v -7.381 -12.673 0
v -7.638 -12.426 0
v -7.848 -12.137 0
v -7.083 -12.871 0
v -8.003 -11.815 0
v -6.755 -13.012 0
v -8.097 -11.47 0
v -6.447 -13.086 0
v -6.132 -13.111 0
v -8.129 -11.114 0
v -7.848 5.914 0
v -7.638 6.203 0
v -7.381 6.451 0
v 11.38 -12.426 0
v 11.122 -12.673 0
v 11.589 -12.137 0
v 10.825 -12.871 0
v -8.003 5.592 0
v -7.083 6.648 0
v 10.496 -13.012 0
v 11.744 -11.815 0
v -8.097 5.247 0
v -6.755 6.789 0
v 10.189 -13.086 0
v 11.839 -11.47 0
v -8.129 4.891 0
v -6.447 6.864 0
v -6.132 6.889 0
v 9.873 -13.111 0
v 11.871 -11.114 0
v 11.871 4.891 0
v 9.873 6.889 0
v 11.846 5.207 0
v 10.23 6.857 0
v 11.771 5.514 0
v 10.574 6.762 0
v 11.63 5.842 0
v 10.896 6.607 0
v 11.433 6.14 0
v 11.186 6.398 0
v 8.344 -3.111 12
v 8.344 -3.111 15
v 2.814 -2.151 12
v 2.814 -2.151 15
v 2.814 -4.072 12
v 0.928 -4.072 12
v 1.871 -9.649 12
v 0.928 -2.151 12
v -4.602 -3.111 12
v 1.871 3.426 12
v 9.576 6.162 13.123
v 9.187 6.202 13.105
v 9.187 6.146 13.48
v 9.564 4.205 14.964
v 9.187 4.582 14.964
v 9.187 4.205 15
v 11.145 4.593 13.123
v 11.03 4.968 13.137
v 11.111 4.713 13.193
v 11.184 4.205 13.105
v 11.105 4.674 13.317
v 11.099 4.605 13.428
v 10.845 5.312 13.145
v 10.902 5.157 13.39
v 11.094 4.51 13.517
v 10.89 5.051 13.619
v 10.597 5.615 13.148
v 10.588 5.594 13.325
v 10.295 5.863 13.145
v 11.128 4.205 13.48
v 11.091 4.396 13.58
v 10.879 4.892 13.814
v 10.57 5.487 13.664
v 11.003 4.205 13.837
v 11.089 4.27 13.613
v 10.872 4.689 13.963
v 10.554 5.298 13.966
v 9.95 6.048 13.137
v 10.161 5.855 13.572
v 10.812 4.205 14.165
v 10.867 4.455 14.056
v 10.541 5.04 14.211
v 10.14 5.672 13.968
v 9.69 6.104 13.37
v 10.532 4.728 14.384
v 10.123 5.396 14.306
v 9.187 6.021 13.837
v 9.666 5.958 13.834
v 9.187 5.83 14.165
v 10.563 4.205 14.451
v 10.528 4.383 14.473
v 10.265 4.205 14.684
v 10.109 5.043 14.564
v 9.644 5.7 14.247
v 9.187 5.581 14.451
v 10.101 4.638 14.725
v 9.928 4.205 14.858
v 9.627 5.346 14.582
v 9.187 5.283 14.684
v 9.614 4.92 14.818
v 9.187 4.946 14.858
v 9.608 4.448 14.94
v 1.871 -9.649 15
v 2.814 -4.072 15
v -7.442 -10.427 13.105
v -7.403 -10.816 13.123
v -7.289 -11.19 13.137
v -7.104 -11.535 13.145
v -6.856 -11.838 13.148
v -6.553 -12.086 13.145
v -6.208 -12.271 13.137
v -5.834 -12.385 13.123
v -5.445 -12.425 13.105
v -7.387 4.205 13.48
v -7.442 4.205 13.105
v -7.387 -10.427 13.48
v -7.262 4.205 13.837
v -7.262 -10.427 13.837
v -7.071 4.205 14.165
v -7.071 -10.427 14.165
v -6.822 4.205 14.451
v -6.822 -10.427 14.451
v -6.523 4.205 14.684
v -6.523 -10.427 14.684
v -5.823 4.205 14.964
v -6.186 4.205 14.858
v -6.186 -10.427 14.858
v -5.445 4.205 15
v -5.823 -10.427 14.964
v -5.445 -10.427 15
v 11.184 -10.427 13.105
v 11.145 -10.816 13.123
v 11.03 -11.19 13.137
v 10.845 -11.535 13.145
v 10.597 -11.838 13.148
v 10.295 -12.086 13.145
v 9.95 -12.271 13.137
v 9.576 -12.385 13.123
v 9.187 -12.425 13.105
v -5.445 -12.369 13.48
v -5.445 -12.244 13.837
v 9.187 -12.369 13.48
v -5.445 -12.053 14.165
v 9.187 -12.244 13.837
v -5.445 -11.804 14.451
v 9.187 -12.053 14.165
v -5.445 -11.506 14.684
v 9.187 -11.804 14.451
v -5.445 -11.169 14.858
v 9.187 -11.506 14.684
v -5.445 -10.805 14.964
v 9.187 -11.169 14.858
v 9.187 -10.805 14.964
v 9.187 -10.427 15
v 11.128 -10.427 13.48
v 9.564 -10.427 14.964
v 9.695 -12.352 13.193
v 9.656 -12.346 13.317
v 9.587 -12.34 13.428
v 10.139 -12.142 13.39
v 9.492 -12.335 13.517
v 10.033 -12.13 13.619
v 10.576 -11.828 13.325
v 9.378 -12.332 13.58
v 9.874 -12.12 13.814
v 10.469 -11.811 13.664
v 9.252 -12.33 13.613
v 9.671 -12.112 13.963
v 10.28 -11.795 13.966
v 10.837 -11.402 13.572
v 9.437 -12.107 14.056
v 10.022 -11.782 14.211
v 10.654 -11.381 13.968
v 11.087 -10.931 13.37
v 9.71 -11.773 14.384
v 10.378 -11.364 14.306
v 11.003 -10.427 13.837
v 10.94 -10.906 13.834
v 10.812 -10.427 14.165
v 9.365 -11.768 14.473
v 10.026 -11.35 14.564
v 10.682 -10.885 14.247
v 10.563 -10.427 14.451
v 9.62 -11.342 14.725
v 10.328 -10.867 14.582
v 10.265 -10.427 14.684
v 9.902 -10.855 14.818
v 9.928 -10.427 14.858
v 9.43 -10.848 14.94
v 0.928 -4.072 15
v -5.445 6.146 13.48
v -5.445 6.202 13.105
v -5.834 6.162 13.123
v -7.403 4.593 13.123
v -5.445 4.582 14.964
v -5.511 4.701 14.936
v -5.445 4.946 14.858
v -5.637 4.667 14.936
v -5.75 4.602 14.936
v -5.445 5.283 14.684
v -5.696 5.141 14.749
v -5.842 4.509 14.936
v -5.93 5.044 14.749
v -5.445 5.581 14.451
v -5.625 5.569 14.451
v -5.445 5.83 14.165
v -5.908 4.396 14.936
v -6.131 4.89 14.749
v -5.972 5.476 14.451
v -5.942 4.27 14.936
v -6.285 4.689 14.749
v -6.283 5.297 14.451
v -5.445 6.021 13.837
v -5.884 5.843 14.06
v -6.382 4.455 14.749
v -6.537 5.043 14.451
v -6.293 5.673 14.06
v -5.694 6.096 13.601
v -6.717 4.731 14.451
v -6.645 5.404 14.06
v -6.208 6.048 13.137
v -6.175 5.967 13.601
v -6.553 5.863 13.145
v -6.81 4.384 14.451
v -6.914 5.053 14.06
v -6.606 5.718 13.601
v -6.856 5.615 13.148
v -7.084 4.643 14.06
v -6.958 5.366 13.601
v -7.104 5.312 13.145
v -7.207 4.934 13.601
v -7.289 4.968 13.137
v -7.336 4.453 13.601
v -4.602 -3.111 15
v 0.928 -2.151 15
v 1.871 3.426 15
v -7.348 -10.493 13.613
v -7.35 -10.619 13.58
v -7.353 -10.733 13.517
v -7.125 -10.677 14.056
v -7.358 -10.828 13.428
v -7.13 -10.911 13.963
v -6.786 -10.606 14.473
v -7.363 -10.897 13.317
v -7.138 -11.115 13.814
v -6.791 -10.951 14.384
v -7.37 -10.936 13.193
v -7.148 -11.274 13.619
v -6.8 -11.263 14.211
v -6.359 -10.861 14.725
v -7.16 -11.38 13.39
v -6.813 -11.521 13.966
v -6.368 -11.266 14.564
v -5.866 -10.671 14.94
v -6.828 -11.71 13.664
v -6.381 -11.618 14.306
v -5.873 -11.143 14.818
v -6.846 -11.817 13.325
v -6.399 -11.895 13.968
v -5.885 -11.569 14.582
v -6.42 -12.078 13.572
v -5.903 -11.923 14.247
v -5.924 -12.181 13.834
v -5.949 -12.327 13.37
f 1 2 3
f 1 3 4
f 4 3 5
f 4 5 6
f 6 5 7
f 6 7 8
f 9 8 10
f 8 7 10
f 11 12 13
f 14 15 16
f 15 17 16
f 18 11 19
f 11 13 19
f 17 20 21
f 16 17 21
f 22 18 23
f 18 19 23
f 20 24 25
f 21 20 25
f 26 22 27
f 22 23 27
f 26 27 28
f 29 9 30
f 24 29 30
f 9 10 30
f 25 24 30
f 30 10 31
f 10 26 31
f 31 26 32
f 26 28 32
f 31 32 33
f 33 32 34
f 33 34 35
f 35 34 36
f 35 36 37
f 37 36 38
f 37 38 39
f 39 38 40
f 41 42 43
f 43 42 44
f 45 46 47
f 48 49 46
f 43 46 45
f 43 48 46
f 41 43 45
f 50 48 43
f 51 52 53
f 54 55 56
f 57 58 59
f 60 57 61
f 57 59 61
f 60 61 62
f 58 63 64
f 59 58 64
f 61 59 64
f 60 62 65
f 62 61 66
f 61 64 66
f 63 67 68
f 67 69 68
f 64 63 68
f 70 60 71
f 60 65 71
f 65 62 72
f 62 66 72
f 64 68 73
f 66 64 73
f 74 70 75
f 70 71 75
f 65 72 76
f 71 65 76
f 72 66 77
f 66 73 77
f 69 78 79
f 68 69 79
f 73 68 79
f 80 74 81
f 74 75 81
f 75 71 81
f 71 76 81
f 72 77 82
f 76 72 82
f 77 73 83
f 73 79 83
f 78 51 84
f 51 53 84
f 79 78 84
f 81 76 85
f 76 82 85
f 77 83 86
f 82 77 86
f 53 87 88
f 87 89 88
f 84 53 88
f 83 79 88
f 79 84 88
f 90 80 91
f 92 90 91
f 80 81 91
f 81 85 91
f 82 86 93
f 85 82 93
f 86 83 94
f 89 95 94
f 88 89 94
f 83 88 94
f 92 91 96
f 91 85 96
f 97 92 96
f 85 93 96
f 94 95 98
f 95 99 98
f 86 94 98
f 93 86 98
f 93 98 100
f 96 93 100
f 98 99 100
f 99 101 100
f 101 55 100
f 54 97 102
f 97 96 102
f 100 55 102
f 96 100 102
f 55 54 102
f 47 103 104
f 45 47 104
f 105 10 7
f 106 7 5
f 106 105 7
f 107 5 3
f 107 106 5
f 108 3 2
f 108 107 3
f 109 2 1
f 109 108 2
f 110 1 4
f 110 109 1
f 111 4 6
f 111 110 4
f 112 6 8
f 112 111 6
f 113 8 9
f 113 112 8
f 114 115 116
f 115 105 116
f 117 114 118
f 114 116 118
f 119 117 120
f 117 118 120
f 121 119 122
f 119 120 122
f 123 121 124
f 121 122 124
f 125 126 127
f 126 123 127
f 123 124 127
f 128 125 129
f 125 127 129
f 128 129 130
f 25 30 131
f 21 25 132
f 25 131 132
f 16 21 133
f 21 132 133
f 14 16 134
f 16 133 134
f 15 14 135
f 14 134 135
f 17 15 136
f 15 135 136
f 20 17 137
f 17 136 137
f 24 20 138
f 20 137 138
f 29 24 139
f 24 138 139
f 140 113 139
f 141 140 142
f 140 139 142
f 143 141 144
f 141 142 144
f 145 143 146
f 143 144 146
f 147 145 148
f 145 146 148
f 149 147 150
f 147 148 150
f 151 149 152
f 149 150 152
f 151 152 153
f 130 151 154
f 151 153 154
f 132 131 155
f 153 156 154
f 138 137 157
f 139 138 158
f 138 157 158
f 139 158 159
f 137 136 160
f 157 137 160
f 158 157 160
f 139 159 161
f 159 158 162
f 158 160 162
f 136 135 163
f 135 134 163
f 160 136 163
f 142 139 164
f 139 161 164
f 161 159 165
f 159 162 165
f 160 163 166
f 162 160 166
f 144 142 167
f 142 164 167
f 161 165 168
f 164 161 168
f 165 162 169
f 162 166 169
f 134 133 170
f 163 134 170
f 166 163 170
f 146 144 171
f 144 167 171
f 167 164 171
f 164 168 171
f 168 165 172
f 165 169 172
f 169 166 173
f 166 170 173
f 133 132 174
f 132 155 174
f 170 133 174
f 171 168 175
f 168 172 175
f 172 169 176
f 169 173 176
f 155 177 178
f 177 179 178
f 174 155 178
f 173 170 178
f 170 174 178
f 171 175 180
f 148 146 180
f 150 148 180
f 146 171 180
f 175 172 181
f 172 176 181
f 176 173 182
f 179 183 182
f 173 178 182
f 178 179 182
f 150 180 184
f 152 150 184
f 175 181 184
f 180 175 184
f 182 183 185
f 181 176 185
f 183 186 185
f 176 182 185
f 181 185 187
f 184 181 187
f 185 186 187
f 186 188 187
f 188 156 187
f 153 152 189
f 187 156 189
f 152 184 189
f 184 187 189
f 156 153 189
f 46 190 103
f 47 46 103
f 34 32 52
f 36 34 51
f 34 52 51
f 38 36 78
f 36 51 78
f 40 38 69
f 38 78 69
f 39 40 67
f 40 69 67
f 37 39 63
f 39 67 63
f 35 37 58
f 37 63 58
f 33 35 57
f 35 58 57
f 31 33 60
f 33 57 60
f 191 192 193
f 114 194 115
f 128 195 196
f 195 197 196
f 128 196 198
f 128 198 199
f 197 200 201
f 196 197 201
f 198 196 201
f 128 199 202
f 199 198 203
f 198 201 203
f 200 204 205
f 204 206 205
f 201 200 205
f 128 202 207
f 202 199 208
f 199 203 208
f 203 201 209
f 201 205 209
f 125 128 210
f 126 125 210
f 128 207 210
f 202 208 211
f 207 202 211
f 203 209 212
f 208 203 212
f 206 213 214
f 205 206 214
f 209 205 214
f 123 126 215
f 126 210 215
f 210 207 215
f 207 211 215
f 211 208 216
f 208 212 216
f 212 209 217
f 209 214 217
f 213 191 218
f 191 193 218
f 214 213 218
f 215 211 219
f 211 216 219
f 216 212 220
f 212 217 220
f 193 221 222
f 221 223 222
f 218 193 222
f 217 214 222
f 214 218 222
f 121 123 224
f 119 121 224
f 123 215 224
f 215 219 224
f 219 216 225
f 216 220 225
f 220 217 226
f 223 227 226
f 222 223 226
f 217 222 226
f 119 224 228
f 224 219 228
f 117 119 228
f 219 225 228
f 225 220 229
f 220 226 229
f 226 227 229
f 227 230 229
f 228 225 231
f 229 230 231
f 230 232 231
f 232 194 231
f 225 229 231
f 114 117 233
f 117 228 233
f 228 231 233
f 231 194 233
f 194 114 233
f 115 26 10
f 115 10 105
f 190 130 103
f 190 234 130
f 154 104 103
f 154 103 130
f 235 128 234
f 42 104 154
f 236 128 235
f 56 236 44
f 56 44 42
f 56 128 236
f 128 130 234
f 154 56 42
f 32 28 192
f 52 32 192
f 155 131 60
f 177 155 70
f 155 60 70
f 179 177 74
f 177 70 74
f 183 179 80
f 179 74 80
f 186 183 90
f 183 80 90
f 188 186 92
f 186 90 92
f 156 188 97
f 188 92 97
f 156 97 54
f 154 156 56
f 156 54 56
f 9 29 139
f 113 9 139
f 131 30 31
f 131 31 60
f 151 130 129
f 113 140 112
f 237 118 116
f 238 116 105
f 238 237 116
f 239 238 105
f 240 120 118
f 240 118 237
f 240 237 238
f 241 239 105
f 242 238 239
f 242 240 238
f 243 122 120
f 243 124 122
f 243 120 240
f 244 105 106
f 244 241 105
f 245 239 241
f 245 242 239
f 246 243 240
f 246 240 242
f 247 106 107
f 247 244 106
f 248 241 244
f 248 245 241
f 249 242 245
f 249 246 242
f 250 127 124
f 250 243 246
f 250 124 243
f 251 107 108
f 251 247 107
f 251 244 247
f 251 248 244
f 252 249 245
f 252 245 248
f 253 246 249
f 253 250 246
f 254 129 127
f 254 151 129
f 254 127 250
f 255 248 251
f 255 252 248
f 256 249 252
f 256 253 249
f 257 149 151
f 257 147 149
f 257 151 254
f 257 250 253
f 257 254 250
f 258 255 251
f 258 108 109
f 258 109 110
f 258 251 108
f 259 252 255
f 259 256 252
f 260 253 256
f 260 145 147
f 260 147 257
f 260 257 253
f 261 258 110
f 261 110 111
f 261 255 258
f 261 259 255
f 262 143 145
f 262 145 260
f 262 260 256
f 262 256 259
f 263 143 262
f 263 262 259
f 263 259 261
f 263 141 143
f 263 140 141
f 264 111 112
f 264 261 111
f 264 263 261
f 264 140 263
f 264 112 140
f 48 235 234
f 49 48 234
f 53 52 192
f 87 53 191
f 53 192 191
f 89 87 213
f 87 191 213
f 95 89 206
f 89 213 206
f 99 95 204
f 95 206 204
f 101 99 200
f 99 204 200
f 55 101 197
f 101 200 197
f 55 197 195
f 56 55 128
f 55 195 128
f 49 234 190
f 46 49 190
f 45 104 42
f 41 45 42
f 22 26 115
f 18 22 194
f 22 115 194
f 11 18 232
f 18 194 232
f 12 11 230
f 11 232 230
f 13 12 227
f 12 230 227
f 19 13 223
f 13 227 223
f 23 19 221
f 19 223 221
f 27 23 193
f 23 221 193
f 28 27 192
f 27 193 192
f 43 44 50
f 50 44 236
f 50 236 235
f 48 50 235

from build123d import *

# Parameters (mm, degrees)
F0_W     = 20
F0_H     = 20
F1_DEPTH = 15
F1_TAPER = 3
F2_R     = 2
F4_DEPTH = 3


with BuildPart() as f1:
    # F0 (on Top) → F1 (new body)
    with BuildSketch(Plane.XY):
        with Locations((1.8707364798, -3.1114496091)):
            Rectangle(F0_W, F0_H)
    extrude(amount=F1_DEPTH, taper=F1_TAPER)

    # F2
    f2_edges = [f1.edges().sort_by_distance(p)[0] for p in [
        (-7.736205, 6.495492, 7.5),
        (1.870736, 6.102434, 15),
        (11.477678, 6.495492, 7.500009),
        (11.08462, -3.11145, 15),
        (11.477678, -12.718391, 7.5),
        (1.870736, -12.325333, 15),
        (-7.343147, -3.11145, 15),
        (-7.736205, -12.718391, 7.5),
    ]]
    fillet(f2_edges, radius=F2_R)

    # F3 (on face) → F4 (cut)
    with BuildSketch(Plane.XY.offset(15)):
        Polygon((2.8135806206, -2.1512166131), (1.8707364798, 3.426121315), (0.927892339, -2.1512166131), (-4.6021803282, -3.1114496091), (0.927892339, -4.071682605), (1.8707364798, -9.6490205332), (2.8135806206, -4.071682605), (8.3436532877, -3.1114496091), align=None)
    extrude(amount=-F4_DEPTH, mode=Mode.SUBTRACT)


solid = f1.part
